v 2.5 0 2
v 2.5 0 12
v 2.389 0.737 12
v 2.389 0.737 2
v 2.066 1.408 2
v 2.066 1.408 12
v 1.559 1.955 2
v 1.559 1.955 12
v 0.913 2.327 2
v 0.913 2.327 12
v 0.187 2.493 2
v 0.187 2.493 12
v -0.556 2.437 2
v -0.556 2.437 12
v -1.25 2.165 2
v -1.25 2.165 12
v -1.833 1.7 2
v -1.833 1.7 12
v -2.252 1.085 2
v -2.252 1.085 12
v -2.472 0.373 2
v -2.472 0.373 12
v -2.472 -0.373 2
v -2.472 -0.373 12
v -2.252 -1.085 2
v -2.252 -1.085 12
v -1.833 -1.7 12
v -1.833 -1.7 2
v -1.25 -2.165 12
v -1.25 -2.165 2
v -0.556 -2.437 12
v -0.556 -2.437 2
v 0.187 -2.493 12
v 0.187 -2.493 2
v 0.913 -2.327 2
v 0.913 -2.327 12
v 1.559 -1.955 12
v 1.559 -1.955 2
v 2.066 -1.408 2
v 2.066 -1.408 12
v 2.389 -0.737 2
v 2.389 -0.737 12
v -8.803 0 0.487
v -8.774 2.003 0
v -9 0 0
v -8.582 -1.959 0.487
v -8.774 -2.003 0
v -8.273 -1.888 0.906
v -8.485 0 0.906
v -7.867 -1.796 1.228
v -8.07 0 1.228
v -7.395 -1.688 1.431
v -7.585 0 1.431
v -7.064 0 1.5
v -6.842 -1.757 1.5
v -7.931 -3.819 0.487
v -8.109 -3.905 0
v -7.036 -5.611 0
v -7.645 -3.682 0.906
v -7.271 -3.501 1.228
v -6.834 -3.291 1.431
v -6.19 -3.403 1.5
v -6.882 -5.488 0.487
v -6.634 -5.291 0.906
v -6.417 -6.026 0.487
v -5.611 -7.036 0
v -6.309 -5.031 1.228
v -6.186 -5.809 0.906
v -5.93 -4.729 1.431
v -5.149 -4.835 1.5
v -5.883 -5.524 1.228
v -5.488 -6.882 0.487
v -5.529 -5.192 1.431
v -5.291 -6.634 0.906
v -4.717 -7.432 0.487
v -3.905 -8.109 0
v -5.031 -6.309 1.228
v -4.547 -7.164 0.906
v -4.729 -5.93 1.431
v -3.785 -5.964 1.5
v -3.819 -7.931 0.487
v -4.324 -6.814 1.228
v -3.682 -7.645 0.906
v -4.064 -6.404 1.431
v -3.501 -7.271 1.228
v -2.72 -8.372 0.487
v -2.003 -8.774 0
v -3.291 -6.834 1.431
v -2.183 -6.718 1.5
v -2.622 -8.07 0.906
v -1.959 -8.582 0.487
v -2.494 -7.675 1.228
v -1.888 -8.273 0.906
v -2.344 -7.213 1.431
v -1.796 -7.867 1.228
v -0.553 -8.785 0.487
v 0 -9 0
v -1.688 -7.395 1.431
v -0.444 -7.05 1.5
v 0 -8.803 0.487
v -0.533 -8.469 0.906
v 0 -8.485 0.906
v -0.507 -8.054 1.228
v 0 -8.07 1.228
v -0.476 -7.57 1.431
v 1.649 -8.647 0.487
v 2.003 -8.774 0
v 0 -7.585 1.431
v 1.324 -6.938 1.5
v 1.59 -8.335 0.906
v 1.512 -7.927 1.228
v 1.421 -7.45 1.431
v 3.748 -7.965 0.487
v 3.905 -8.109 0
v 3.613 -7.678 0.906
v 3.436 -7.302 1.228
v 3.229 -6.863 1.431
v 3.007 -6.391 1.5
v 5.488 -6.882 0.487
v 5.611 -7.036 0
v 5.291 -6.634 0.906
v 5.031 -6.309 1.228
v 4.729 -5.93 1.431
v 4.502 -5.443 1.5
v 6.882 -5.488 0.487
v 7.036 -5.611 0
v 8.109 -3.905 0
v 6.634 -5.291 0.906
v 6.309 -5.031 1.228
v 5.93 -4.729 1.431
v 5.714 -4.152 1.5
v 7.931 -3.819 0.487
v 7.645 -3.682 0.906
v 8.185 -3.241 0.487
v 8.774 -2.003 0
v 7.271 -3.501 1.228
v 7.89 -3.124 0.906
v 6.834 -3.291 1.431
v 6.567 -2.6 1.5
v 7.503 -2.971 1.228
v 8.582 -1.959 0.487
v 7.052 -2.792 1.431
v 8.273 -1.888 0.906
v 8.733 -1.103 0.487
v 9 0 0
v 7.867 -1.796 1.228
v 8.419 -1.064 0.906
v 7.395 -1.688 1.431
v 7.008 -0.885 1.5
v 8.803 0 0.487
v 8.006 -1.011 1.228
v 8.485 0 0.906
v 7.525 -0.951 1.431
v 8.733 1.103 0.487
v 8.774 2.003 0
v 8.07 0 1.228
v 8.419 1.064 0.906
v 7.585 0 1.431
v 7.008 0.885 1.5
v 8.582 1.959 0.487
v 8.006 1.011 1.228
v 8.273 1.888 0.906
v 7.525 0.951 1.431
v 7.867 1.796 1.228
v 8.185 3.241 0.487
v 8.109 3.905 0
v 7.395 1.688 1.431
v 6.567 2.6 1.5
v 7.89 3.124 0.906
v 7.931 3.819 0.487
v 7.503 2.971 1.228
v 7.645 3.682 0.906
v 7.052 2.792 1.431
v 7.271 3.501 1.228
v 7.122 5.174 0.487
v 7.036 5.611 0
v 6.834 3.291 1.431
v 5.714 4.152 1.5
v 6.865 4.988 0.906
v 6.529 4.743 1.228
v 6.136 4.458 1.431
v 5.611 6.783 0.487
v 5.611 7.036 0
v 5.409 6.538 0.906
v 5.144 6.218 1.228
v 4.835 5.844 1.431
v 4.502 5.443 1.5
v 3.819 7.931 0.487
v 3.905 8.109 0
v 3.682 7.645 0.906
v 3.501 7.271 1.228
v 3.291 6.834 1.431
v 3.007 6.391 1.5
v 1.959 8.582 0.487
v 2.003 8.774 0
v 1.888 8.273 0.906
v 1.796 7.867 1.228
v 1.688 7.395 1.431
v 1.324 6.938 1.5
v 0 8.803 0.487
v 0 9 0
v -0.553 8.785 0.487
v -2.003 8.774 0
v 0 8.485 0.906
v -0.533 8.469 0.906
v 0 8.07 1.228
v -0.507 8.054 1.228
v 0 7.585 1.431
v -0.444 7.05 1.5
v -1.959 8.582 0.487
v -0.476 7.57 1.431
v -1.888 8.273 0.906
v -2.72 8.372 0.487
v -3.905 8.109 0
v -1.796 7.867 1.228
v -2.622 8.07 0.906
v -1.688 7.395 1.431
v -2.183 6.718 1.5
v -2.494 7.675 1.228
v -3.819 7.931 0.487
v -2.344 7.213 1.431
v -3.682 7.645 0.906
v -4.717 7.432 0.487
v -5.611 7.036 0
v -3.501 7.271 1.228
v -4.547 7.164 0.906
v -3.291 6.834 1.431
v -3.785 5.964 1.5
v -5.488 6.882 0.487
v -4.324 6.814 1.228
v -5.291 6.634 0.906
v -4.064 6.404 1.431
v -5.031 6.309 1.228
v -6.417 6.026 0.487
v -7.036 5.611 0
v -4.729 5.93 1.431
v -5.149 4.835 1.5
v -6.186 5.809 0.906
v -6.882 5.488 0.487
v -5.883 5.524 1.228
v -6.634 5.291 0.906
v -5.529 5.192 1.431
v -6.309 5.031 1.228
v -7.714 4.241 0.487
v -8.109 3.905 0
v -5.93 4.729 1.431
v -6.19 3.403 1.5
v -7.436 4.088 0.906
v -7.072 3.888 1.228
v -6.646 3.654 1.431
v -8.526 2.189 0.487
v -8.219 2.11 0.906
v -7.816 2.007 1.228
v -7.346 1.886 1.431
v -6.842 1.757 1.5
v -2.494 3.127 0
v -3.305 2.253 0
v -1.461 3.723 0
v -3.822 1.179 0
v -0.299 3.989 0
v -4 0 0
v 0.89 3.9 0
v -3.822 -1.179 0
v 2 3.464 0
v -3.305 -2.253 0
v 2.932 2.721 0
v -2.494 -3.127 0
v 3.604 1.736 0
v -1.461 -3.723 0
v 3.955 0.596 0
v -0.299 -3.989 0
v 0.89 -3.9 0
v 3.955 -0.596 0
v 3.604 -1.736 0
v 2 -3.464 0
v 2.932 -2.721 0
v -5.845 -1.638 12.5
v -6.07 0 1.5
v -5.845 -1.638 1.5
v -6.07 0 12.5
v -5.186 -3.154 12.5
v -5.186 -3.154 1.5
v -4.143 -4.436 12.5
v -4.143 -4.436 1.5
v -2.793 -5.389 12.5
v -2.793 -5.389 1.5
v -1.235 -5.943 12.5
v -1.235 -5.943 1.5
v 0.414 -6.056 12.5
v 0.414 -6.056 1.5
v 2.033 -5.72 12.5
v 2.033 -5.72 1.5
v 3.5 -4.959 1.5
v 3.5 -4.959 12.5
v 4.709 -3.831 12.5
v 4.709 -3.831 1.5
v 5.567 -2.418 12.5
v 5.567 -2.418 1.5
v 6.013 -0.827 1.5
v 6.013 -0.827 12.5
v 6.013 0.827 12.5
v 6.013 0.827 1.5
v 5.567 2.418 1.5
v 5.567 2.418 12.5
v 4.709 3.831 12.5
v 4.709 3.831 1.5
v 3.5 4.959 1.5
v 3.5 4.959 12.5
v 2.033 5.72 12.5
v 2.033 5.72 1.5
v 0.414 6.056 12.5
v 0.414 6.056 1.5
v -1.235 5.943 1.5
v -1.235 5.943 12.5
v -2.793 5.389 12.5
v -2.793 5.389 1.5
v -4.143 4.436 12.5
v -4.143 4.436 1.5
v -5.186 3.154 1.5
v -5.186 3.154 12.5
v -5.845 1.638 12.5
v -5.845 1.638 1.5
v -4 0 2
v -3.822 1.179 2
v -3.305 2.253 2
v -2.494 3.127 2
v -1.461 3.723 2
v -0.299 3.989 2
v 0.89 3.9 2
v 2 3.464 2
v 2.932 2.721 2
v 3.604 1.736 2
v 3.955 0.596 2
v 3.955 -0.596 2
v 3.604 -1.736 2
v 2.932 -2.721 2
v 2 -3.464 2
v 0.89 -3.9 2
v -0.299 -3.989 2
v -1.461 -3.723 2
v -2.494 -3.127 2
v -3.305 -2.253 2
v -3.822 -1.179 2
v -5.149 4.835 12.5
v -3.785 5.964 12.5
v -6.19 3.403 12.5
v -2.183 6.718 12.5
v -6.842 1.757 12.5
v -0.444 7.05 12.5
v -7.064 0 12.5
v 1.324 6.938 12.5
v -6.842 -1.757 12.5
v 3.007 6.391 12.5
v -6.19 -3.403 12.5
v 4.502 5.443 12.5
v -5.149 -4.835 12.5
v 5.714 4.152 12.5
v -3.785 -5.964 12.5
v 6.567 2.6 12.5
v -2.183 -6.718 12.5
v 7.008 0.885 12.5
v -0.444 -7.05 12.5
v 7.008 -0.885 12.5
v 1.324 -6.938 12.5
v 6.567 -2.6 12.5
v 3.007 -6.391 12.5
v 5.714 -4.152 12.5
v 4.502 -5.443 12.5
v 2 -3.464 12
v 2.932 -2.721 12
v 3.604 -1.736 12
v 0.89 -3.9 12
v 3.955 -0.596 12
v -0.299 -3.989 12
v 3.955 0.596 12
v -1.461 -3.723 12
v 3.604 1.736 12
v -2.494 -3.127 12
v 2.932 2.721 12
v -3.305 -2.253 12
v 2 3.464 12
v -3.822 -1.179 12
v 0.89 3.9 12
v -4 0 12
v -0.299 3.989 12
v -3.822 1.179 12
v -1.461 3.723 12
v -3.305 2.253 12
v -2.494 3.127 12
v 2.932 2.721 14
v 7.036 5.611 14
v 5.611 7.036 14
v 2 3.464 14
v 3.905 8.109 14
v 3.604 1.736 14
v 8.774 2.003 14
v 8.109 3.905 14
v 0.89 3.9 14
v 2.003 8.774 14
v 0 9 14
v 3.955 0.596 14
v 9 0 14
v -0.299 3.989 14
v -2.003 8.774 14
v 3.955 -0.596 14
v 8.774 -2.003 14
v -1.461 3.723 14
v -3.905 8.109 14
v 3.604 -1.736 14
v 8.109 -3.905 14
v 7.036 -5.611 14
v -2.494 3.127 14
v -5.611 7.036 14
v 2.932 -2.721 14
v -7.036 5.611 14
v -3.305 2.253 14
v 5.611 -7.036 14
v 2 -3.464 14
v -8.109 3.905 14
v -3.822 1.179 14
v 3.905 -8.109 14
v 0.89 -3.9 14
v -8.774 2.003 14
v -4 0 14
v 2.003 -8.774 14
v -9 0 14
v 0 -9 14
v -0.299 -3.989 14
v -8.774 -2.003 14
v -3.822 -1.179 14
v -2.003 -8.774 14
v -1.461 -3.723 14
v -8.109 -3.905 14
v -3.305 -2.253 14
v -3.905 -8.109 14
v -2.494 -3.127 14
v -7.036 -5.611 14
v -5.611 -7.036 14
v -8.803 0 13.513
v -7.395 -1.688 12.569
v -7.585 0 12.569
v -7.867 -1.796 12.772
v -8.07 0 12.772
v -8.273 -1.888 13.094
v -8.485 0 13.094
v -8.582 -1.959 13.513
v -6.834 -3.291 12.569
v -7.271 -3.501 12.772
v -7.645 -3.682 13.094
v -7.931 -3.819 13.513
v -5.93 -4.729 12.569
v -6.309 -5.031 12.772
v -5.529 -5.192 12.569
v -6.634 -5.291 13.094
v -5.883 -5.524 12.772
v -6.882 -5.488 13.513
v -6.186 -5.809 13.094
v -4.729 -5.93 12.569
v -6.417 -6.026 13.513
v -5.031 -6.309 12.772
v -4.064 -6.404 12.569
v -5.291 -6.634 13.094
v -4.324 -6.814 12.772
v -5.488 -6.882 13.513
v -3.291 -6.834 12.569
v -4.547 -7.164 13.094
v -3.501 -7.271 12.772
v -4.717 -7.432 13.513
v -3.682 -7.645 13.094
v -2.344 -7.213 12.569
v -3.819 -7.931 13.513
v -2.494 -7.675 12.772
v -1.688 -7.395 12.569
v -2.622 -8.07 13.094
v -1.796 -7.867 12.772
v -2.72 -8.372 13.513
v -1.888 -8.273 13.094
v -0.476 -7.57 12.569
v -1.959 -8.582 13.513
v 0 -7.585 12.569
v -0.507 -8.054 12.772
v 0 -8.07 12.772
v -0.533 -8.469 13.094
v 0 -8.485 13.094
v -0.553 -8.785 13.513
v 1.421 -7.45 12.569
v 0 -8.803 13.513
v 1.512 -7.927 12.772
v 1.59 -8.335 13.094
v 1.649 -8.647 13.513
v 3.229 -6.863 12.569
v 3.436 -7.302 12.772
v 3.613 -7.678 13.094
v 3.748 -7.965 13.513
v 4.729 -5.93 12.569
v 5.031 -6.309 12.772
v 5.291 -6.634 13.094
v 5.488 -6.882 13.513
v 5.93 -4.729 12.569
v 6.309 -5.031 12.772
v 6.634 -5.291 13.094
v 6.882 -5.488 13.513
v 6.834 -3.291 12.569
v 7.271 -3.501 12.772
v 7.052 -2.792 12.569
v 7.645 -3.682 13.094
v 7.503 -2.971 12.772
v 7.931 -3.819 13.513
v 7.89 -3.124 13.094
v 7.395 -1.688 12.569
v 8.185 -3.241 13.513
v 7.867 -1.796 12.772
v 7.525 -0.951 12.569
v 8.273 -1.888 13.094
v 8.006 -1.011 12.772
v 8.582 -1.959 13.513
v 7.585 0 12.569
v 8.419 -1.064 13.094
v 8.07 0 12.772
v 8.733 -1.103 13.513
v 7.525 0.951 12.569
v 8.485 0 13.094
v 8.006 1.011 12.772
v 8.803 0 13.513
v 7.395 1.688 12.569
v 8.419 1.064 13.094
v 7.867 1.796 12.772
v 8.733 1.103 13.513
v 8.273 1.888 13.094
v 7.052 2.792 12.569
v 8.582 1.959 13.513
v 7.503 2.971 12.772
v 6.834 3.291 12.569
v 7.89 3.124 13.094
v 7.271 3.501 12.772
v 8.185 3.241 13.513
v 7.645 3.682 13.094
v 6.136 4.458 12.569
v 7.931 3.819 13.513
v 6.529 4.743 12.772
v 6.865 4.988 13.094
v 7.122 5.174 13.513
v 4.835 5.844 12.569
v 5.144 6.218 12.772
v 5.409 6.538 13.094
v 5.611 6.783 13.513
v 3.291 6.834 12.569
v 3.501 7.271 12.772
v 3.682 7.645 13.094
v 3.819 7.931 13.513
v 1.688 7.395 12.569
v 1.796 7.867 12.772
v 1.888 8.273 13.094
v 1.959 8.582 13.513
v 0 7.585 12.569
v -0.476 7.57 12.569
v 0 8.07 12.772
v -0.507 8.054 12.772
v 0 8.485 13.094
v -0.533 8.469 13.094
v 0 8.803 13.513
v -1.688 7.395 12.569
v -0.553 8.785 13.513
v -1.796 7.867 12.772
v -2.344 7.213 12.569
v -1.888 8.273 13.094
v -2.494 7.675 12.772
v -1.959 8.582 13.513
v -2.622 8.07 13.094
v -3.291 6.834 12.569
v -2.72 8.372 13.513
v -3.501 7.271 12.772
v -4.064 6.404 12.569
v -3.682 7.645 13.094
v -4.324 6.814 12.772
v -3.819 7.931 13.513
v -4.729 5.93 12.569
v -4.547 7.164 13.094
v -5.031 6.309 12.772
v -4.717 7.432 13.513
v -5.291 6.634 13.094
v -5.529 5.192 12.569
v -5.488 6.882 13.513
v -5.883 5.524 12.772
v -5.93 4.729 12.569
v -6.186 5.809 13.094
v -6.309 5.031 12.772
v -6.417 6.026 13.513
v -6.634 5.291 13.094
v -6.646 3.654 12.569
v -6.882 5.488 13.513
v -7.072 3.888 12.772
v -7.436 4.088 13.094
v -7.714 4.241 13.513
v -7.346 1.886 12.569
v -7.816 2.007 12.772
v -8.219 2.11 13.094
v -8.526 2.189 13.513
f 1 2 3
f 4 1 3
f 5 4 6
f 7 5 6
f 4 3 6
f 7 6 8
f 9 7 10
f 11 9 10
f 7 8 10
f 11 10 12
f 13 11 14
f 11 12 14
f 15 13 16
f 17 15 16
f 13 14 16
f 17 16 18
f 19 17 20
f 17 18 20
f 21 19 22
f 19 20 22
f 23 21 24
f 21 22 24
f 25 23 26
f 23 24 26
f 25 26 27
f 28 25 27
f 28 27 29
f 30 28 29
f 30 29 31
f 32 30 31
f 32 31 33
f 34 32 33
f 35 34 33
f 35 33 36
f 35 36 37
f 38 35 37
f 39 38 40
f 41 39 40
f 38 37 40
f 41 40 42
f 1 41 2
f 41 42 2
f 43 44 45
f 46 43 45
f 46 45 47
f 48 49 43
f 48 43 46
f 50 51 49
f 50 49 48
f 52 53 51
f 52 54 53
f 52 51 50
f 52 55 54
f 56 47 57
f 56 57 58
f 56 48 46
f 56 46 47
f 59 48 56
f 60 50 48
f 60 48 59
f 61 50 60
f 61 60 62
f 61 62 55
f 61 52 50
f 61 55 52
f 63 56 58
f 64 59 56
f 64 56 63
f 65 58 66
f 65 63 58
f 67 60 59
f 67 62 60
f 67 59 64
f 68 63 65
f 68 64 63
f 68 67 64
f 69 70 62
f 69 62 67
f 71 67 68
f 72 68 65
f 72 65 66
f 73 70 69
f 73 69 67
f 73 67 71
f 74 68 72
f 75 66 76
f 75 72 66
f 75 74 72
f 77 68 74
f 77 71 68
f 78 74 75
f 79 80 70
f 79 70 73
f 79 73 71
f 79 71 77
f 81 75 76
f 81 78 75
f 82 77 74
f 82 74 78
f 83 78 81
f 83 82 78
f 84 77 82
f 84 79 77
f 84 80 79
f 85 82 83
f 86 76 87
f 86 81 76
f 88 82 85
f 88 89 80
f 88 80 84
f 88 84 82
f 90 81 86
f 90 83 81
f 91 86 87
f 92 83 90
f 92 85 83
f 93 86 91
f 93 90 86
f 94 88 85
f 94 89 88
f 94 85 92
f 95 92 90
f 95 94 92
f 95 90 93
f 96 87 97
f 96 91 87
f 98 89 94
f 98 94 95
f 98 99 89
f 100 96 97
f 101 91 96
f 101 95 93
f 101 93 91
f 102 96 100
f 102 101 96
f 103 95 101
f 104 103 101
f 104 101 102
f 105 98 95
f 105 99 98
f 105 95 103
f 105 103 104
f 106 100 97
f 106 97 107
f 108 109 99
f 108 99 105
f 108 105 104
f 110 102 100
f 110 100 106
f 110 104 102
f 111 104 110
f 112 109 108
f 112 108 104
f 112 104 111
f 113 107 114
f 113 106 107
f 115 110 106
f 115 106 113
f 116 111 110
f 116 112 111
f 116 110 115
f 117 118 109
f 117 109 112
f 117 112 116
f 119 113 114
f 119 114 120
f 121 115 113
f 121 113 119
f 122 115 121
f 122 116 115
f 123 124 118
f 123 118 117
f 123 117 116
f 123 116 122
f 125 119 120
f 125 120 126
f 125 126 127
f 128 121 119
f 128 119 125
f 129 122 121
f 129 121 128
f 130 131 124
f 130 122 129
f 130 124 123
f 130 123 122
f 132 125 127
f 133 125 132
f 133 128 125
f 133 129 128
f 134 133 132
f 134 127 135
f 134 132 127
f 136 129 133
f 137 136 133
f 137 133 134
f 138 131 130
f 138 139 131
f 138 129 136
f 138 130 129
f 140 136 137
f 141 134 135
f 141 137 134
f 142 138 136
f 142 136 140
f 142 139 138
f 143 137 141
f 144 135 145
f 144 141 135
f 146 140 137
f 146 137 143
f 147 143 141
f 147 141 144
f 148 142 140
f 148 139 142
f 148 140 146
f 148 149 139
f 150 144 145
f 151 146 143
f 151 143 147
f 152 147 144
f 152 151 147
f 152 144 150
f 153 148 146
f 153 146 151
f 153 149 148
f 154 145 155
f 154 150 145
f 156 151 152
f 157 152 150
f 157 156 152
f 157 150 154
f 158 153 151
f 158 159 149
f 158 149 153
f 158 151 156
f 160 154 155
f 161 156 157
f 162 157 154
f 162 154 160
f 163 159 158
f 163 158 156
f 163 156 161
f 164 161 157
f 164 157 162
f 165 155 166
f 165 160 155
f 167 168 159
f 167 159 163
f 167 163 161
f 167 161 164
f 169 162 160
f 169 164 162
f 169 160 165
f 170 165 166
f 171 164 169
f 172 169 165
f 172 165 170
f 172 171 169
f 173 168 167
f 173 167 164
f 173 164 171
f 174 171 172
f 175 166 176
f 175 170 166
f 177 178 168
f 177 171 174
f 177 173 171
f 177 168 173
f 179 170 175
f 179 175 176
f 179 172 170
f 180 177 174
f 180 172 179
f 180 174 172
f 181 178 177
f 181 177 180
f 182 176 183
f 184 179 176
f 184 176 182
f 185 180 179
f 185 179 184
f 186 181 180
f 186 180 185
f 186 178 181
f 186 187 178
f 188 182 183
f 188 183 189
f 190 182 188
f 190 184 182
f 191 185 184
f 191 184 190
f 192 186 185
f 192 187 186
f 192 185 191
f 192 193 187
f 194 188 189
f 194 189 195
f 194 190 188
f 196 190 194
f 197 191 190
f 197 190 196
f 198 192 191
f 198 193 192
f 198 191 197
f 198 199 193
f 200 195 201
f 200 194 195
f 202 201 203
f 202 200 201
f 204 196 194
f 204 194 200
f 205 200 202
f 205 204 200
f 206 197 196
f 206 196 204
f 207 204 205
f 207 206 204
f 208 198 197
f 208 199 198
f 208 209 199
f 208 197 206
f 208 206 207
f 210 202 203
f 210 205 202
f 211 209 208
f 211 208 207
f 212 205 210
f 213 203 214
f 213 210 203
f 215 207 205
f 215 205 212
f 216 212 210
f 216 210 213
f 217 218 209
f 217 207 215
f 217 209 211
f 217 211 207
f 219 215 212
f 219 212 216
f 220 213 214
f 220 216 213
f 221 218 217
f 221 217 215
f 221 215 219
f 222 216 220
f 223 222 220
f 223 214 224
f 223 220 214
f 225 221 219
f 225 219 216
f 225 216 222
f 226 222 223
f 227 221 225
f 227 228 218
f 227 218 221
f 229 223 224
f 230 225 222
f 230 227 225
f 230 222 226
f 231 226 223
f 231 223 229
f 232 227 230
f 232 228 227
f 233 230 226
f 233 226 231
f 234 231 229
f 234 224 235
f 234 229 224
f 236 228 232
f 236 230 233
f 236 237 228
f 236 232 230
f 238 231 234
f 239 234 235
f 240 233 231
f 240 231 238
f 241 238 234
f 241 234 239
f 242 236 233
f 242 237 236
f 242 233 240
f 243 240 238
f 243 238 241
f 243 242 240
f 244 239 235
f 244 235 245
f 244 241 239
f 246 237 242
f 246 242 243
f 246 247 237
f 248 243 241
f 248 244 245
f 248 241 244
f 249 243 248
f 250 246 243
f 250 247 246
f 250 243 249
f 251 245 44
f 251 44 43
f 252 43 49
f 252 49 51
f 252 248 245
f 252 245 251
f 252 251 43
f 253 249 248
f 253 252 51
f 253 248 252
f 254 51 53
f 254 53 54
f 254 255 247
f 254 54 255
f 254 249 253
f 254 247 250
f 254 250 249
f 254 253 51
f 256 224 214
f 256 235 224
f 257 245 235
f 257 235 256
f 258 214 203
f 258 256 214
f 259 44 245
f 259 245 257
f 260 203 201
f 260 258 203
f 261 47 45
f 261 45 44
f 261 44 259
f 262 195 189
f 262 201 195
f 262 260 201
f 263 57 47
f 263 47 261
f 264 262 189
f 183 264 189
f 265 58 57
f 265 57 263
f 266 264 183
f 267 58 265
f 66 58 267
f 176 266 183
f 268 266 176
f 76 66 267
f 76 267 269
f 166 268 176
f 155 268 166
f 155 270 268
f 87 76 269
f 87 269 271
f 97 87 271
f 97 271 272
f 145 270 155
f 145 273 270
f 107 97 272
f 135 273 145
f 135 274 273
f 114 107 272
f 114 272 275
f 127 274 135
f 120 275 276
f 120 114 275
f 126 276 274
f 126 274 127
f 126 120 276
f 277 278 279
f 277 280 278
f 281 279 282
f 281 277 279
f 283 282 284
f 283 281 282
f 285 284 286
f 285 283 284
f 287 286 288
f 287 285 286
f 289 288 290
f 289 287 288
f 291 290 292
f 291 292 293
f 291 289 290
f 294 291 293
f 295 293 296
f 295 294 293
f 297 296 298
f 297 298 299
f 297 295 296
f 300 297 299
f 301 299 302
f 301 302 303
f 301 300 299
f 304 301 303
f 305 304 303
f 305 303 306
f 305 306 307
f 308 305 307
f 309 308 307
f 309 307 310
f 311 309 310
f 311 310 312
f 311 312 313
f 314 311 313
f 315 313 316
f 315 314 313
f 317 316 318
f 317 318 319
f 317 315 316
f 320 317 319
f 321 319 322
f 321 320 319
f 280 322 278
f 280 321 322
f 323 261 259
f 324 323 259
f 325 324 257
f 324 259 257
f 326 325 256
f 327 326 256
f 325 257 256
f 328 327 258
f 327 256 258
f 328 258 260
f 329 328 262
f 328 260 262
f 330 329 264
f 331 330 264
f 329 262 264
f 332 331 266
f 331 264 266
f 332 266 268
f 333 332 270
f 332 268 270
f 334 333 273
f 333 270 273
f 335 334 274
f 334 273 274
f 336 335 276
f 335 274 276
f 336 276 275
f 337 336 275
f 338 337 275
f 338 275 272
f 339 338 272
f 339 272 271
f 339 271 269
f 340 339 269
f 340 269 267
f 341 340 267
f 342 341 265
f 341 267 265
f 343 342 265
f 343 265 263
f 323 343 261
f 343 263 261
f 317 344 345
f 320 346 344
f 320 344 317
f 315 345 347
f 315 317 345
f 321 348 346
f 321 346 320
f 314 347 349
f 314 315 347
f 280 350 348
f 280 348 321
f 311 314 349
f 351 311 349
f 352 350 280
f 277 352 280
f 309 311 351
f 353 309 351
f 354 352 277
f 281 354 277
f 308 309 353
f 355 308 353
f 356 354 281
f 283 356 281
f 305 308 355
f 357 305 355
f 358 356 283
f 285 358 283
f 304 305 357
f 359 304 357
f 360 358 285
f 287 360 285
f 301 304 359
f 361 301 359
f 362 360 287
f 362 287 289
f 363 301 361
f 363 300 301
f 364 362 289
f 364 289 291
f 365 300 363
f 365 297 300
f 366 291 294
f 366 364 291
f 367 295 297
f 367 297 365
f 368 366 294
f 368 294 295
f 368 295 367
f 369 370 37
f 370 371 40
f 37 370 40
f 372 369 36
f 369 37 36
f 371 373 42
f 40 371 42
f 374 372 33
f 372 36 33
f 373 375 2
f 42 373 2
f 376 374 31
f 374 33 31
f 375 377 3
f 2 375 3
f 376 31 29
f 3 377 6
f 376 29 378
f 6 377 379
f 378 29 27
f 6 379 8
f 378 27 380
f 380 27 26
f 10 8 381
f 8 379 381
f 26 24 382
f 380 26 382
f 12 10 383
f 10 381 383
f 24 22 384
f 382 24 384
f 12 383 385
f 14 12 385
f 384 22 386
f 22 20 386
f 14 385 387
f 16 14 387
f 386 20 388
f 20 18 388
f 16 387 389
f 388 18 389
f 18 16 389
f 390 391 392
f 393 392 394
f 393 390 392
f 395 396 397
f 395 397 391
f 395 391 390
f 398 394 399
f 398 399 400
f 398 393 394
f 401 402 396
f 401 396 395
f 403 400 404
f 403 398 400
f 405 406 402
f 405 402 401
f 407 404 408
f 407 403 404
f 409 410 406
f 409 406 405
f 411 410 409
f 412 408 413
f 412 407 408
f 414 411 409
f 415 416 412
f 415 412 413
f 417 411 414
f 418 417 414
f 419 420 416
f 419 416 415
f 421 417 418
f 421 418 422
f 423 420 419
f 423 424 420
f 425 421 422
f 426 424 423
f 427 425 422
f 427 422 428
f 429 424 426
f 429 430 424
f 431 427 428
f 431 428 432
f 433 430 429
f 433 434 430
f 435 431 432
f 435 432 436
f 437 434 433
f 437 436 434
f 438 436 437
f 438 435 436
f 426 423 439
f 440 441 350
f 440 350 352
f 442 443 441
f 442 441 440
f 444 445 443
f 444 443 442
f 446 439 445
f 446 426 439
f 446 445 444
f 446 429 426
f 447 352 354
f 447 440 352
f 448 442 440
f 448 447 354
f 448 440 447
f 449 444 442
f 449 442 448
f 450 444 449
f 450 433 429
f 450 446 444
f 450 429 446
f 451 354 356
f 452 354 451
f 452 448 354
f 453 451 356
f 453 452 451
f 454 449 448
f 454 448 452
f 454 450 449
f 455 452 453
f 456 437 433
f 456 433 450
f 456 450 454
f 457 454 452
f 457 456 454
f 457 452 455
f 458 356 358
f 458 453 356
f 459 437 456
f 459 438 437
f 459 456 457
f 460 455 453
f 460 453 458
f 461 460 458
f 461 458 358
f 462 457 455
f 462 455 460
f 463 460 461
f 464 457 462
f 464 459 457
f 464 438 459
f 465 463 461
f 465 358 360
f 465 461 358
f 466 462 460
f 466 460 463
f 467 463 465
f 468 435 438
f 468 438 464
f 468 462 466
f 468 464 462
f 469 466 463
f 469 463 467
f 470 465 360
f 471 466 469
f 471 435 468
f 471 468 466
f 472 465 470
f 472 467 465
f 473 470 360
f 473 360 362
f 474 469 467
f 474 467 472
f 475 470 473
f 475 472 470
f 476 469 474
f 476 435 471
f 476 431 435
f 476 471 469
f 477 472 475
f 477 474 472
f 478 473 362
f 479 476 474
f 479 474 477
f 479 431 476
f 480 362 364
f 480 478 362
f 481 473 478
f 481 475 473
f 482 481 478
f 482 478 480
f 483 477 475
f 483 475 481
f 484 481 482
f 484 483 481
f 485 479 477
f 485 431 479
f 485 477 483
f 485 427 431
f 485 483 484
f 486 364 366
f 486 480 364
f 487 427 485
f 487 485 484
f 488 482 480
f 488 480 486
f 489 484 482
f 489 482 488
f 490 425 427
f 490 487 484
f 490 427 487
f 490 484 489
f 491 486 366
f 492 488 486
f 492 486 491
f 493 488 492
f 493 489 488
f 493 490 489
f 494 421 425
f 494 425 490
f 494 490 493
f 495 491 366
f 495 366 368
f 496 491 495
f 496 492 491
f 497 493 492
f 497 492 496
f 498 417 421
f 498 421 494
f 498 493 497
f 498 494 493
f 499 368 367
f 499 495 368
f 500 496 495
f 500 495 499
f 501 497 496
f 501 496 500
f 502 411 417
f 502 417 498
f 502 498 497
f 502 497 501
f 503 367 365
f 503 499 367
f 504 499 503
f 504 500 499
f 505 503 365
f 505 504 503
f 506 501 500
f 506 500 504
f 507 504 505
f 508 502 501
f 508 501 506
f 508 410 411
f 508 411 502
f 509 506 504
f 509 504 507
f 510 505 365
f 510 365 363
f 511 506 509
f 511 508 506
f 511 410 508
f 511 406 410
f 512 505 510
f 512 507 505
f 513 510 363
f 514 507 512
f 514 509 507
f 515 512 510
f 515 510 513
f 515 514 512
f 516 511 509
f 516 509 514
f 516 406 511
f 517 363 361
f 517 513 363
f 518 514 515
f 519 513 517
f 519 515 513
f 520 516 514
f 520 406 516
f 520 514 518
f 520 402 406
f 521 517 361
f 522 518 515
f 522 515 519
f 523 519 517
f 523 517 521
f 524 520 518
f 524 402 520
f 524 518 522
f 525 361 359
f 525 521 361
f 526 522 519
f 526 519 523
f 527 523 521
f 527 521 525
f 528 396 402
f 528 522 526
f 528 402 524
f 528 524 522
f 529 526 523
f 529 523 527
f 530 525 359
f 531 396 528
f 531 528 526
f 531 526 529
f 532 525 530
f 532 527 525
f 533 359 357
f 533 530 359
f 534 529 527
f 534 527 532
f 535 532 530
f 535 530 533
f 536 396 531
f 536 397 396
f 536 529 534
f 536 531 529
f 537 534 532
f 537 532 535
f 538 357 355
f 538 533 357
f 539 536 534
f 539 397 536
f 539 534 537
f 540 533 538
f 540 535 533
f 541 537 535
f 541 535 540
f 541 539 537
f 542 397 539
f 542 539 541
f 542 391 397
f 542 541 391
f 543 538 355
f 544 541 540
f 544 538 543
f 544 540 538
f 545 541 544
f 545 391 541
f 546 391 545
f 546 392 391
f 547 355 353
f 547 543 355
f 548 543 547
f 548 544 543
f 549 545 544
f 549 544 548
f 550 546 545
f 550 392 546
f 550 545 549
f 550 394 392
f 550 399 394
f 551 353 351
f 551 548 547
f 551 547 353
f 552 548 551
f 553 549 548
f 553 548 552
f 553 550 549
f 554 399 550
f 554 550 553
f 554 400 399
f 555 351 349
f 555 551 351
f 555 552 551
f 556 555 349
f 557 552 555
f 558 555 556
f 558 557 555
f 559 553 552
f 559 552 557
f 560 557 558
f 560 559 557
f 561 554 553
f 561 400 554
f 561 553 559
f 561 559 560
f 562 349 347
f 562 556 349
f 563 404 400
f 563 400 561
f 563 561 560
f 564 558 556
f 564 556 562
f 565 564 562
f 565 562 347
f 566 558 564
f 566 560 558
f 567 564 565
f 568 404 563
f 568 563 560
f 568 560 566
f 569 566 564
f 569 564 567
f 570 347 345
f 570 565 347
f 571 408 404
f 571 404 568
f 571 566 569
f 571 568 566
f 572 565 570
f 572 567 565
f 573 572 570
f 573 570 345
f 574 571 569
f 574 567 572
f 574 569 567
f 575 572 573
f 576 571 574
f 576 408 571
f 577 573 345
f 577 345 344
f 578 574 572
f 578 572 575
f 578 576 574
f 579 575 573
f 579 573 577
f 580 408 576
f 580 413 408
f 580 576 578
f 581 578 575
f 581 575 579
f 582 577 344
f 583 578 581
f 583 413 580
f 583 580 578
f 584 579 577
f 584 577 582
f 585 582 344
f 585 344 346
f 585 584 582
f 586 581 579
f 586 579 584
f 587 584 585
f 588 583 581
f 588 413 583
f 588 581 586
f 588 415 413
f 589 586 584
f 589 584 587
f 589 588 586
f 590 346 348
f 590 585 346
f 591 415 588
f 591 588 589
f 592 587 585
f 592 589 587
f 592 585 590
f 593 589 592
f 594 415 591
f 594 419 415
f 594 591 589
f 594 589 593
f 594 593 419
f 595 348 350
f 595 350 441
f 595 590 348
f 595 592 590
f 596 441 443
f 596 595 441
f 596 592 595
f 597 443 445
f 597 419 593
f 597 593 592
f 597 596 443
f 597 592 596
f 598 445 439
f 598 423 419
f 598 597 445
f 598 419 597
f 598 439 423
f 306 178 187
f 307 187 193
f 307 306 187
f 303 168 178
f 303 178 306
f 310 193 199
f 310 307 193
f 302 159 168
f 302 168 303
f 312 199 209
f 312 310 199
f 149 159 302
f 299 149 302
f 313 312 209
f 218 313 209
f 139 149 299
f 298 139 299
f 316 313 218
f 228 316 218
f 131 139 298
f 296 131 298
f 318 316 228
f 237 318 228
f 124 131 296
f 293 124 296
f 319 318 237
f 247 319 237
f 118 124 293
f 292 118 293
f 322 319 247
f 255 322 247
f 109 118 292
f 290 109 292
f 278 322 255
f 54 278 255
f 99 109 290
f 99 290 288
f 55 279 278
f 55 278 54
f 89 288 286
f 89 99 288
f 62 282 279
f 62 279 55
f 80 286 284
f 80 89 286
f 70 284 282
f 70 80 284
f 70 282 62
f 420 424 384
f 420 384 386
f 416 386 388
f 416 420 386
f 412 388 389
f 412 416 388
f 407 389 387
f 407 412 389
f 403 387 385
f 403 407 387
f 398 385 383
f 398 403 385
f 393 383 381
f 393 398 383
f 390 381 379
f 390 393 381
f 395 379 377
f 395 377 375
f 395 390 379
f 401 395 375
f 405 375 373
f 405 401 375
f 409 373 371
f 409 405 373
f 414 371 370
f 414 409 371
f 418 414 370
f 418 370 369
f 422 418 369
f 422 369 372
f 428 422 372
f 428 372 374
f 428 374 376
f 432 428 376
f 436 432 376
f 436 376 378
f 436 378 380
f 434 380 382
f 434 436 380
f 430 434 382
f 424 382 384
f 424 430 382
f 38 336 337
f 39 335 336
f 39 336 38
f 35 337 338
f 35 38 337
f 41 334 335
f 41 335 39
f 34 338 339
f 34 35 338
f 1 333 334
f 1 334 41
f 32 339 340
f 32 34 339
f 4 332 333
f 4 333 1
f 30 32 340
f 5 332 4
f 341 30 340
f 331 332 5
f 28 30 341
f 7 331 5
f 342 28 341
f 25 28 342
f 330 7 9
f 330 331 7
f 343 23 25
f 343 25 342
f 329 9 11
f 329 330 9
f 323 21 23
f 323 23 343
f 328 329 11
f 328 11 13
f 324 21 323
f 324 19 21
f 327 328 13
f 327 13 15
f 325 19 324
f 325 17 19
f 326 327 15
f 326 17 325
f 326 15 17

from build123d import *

# Parameters (mm, degrees)
FILLET1_R          = 2
SKETCH2_R          = 4
CUT_EXTRUDE2_DEPTH = 2
SKETCH4_R          = 2.5
CUT_EXTRUDE3_DEPTH = 10


with BuildPart() as part:
    # Sketch1 → Revolve1 (revolve)
    with BuildSketch(Plane(origin=(0, 0, 0), x_dir=(1, 0, 0), z_dir=(0, 1, 0)), mode=Mode.PRIVATE) as revolve1_sk:
        Polygon((0, 0), (9, 0), (9, -1.5), (6.07, -1.5), (6.07, -12.5), (9, -12.5), (9, -14), (0, -14), align=None)
    revolve(revolve1_sk.sketch.rotate(Axis((0, 0, -9.941176471), (0, 0, 1)), 180), axis=Axis((0, 0, -9.941176471), (0, 0, 1)))

    # Fillet1
    # the kernel refuses this fillet: 2 mm, written as the material it takes off along each edge
    with BuildSketch(Plane(origin=(0, 0, 12.5), x_dir=(-1, 0, 0), z_dir=(0, 1, 0))) as fillet1_piece_1:
        with BuildLine():
            CenterArc((7.063508327, 2), FILLET1_R, 270, 75.522487814)
            Line((9, 1.5), (9.038729833, 1.49))
            ThreePointArc((9.038729833, 1.49), (9.04, 0.75), (9.04, 0))
            Line((9.04, 0), (9, -0.04))
            Line((9, -0.04), (7.063508327, -0.04))
            Line((7.063508327, -0.04), (7.063508327, 0))
        make_face()
    revolve(axis=Axis((0, 0, 12.5), (0, 0, 1)), mode=Mode.SUBTRACT)
    with BuildSketch(Plane(origin=(0, 0, 1.5), x_dir=(-1, 0, 0), z_dir=(0, 1, 0))) as fillet1_piece_2:
        with BuildLine():
            CenterArc((7.063508327, -2), FILLET1_R, 14.477512186, 75.522487814)
            Line((7.063508327, 0), (7.063508327, 0.04))
            Line((7.063508327, 0.04), (9, 0.04))
            Line((9, 0.04), (9.04, 0))
            ThreePointArc((9.04, 0), (9.04, -0.75), (9.038729833, -1.49))
            Line((9.038729833, -1.49), (9, -1.5))
        make_face()
    revolve(axis=Axis((0, 0, 1.5), (0, 0, 1)), mode=Mode.SUBTRACT)

    # Sketch2 → Cut-Extrude2 (cut)
    with BuildSketch(Plane(origin=(0, 0, 0), x_dir=(-1, 0, 0), z_dir=(0, 0, -1))):
        Circle(SKETCH2_R)
    cut_extrude2 = extrude(amount=-CUT_EXTRUDE2_DEPTH, mode=Mode.SUBTRACT)

    # Mirror1: Cut-Extrude2 across plane
    add(cut_extrude2.mirror(Plane(origin=(0, 0, 7), x_dir=(1, 0, 0), z_dir=(0, 0, -1))), mode=Mode.SUBTRACT)

    # Sketch4 → Cut-Extrude3 (cut)
    with BuildSketch(Plane.XY.offset(12)):
        Circle(SKETCH4_R)
    extrude(amount=-CUT_EXTRUDE3_DEPTH, mode=Mode.SUBTRACT)


solid = part.part
